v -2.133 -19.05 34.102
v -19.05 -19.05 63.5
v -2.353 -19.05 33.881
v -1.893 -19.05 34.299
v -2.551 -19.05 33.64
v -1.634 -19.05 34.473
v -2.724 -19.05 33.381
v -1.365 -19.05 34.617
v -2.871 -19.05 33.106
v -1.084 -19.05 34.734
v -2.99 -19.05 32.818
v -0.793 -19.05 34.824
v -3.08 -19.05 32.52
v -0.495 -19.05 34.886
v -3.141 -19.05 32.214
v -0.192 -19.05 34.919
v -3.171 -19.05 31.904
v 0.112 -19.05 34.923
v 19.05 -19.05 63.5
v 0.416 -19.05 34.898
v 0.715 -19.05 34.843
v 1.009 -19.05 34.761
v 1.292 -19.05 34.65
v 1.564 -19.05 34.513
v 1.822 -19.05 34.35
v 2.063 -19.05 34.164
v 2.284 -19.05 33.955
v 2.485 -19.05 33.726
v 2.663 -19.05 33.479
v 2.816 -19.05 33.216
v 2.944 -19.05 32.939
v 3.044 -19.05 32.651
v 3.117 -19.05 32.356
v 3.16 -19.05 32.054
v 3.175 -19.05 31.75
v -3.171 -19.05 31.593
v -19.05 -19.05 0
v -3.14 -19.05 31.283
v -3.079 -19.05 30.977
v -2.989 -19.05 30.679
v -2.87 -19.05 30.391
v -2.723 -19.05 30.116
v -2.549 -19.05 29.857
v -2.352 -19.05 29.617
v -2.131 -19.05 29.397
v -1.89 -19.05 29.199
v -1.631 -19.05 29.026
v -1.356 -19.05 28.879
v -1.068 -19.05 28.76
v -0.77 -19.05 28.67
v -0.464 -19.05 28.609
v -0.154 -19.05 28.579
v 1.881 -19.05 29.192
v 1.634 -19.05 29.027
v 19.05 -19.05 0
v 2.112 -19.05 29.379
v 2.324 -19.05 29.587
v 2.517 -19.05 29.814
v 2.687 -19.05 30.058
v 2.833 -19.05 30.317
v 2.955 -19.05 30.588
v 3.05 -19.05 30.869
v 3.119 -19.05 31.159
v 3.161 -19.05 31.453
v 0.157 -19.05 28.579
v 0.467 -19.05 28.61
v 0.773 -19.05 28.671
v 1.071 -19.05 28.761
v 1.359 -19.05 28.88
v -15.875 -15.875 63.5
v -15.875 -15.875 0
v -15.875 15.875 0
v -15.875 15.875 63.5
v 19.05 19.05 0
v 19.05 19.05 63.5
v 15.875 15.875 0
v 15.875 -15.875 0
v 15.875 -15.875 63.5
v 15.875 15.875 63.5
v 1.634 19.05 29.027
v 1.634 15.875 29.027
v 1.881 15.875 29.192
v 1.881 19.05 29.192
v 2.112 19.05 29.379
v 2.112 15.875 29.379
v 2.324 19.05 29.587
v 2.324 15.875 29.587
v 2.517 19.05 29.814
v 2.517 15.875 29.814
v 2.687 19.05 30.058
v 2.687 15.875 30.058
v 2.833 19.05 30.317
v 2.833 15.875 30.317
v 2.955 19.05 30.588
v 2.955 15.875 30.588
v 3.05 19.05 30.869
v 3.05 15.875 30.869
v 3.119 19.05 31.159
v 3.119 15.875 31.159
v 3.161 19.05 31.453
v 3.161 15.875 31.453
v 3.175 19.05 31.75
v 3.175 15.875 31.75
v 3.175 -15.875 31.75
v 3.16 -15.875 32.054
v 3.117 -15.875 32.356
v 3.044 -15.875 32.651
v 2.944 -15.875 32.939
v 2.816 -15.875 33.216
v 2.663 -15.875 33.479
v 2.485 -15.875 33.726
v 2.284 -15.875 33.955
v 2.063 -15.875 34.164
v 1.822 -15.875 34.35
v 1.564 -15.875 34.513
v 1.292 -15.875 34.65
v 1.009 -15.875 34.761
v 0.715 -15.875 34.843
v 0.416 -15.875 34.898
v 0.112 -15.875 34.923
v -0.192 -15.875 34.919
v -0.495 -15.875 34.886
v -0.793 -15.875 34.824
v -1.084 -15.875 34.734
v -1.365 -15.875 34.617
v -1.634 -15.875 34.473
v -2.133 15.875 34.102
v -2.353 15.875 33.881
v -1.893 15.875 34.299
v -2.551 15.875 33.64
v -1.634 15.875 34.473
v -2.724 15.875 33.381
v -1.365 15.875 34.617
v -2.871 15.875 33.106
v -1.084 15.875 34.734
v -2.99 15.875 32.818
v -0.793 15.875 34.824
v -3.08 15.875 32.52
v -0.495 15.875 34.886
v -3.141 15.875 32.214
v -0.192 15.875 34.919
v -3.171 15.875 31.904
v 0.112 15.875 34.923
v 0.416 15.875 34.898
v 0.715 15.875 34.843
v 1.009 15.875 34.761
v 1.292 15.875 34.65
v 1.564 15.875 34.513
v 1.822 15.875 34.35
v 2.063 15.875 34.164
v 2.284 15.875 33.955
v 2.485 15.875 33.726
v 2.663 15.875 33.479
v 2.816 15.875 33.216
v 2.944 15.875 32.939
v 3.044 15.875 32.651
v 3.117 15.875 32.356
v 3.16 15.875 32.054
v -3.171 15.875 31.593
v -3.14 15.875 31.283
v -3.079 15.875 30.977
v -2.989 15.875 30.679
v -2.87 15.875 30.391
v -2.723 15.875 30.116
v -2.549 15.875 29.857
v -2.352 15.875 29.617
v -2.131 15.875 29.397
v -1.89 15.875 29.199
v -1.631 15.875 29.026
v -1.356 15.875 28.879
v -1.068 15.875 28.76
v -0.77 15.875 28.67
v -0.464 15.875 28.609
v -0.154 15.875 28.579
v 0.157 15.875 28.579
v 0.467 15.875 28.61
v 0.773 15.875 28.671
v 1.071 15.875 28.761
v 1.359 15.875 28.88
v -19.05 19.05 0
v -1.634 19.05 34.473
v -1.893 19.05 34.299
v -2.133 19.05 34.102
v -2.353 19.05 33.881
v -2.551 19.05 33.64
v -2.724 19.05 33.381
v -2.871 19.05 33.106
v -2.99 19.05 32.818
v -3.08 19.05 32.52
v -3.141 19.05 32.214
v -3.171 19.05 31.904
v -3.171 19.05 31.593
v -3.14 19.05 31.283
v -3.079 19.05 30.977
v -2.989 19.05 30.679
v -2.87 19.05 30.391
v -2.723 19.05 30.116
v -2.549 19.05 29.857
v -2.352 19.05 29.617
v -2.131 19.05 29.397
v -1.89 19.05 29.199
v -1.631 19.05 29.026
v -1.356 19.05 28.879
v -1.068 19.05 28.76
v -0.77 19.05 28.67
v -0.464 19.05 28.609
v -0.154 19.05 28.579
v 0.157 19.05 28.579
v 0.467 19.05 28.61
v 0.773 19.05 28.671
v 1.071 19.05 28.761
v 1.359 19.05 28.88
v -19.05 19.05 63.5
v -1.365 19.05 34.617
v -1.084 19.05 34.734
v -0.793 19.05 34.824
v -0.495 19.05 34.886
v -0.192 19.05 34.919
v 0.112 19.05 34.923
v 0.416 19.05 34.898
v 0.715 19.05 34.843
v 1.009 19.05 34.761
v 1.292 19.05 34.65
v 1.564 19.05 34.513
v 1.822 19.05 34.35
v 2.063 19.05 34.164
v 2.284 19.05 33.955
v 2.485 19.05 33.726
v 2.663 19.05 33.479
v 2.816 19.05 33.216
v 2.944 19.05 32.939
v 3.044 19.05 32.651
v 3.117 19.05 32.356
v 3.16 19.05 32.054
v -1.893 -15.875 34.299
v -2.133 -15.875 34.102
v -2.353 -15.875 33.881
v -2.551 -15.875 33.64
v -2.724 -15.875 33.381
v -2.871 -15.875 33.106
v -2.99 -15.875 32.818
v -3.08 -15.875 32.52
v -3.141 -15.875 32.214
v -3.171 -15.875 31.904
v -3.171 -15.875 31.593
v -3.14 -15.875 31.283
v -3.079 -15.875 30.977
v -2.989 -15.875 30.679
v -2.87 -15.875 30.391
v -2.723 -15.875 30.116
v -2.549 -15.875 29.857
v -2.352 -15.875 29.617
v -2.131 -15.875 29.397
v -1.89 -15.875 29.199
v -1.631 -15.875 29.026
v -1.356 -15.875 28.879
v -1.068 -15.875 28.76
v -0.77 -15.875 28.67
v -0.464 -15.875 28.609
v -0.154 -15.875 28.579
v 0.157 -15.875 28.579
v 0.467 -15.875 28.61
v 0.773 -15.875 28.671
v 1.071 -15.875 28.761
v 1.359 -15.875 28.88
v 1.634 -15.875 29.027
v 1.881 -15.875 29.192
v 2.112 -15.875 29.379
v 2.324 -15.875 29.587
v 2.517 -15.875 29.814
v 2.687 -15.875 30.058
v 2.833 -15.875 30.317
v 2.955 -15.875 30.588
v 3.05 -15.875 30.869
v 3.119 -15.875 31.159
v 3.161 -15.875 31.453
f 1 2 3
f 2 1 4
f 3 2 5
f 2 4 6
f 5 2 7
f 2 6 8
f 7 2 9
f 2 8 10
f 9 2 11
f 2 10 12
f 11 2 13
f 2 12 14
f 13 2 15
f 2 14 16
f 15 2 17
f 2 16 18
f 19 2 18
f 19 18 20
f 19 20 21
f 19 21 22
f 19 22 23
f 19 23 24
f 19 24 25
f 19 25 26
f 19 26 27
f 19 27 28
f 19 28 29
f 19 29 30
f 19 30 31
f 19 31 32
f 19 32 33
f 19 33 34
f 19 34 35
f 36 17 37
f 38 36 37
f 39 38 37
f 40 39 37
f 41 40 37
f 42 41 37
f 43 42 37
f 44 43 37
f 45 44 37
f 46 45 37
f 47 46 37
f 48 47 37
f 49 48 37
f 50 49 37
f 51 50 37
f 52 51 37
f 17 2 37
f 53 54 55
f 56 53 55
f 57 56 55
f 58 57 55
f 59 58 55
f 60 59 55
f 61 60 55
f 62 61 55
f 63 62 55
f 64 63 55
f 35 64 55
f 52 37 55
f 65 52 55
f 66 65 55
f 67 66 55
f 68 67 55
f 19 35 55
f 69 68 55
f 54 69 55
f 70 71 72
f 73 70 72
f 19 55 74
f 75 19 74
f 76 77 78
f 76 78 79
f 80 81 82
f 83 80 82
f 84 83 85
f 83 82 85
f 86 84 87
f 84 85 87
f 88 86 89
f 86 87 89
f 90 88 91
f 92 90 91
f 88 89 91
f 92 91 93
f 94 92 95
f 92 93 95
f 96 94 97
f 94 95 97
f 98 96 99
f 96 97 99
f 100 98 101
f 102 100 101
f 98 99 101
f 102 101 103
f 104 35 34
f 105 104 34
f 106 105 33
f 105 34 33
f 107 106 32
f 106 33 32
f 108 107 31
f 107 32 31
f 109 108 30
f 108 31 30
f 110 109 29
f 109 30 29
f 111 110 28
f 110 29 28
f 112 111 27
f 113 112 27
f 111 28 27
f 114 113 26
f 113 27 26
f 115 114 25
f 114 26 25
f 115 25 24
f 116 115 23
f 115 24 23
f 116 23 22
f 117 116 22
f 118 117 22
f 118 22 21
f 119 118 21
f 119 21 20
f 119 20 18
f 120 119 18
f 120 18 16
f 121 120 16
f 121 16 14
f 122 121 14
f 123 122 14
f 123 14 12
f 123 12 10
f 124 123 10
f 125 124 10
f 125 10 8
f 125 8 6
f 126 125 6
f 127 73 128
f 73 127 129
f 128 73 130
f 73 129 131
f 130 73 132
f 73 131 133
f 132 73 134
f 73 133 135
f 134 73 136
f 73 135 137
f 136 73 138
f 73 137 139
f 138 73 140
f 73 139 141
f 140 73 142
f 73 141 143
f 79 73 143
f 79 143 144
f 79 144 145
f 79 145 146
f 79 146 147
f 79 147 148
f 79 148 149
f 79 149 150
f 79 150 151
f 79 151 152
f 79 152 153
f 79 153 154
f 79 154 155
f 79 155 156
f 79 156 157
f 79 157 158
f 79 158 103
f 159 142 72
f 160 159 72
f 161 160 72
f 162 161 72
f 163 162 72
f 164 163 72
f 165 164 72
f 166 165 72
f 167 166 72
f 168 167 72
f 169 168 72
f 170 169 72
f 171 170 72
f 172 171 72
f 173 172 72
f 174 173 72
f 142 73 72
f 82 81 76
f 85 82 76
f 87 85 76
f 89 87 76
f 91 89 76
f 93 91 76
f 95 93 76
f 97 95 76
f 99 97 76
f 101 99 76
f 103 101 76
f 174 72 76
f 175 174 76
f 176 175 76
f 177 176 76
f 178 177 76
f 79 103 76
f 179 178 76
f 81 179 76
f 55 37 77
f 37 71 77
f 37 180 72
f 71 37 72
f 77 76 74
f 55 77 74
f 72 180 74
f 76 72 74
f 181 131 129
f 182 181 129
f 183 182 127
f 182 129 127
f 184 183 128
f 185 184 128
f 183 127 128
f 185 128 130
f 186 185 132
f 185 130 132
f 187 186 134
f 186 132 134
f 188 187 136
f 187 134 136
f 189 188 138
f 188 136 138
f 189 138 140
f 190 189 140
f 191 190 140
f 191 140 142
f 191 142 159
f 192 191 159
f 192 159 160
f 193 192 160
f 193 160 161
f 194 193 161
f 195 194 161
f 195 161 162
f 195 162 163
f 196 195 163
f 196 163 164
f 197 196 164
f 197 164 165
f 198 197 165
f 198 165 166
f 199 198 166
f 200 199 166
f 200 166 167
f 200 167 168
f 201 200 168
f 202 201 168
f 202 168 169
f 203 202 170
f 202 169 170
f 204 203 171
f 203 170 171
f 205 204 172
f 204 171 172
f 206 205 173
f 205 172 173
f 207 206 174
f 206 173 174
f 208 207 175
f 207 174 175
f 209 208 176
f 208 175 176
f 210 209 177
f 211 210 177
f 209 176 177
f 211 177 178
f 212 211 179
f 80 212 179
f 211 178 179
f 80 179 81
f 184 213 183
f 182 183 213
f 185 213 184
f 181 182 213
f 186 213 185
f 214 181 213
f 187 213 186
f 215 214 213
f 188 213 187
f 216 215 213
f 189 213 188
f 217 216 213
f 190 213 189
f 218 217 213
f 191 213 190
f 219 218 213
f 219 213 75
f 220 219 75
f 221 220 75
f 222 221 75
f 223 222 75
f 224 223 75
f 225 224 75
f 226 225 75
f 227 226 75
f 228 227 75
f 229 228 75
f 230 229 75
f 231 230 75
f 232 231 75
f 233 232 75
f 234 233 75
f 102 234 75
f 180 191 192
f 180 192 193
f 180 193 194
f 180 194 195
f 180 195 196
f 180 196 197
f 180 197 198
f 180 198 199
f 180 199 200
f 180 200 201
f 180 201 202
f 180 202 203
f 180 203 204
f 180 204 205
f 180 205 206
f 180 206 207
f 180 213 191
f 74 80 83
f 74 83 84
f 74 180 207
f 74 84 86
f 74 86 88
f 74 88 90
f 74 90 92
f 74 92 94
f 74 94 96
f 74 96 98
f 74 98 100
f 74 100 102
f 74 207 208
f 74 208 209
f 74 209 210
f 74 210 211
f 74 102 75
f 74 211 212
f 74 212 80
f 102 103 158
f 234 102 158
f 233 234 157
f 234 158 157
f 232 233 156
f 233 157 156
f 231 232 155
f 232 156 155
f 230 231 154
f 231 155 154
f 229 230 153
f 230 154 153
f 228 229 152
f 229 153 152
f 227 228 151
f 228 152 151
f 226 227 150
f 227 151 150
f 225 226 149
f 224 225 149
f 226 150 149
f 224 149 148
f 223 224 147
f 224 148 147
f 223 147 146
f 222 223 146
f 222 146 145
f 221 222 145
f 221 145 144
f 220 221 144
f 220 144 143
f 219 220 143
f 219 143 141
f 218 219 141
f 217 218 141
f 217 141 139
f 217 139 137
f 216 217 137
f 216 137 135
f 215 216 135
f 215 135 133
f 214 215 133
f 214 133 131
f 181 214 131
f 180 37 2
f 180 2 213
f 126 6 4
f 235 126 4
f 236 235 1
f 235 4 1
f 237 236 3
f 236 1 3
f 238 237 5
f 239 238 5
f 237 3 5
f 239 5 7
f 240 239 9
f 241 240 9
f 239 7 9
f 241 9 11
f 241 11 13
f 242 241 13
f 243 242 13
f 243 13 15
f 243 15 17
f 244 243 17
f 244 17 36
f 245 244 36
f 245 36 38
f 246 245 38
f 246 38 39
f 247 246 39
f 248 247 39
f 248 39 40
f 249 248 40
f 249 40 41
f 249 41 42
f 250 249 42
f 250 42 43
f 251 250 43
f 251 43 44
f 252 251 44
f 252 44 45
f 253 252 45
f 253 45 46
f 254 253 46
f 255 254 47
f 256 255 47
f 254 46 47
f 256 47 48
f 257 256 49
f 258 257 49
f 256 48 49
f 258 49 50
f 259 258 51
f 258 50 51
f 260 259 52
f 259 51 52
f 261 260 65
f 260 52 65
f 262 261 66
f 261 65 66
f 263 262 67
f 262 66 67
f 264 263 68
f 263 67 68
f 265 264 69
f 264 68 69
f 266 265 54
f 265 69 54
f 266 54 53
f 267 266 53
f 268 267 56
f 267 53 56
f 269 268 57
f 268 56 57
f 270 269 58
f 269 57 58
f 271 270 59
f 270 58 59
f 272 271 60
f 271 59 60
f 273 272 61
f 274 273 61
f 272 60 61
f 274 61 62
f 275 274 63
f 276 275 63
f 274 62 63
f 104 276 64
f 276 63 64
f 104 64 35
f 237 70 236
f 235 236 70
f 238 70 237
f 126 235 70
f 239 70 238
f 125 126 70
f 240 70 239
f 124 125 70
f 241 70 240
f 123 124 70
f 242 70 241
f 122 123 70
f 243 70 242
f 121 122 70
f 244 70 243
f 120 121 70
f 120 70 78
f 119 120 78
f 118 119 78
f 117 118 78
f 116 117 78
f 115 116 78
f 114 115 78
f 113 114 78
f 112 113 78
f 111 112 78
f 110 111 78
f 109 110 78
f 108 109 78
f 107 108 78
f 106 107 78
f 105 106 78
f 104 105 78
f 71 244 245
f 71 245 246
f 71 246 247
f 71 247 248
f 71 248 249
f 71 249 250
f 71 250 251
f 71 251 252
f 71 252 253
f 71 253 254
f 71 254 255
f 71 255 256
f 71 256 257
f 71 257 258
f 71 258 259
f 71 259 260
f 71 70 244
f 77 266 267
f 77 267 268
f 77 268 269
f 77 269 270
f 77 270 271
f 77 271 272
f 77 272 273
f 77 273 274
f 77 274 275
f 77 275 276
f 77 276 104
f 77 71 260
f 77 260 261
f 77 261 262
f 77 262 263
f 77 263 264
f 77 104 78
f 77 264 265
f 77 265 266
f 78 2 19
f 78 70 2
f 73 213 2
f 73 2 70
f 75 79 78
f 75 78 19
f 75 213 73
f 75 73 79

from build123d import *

# Parameters (mm, degrees)
F0_W     = 38.1
F0_H     = 38.1
F0_W_2   = 31.75
F0_H_2   = 31.75
F1_DEPTH = 63.5
F3_DEPTH = 38.101


with BuildPart() as f1:
    # F0 (on Top) → F1 (new body)
    with BuildSketch(Plane.XY):
        Rectangle(F0_W, F0_H)
        Rectangle(F0_W_2, F0_H_2, mode=Mode.SUBTRACT)
    extrude(amount=F1_DEPTH)

    # F2 (on face) → F3 (cut, through all)
    with BuildSketch(Plane.XZ.offset(19.05)):
        with BuildLine():
            ThreePointArc((3.175, 31.75), (1.564319, 34.512885), (-1.633524, 34.47254))
            Line((-1.633524, 34.47254), (1.633524, 29.02746))
            ThreePointArc((1.633524, 29.02746), (2.762885, 30.185681), (3.175, 31.75))
        make_face()
        with BuildLine():
            Line((1.633524, 29.02746), (-1.633524, 34.47254))
            ThreePointArc((-1.633524, 34.47254), (-2.72254, 30.116476), (1.633524, 29.02746))
        make_face()
    extrude(amount=-F3_DEPTH, mode=Mode.SUBTRACT)


solid = f1.part
